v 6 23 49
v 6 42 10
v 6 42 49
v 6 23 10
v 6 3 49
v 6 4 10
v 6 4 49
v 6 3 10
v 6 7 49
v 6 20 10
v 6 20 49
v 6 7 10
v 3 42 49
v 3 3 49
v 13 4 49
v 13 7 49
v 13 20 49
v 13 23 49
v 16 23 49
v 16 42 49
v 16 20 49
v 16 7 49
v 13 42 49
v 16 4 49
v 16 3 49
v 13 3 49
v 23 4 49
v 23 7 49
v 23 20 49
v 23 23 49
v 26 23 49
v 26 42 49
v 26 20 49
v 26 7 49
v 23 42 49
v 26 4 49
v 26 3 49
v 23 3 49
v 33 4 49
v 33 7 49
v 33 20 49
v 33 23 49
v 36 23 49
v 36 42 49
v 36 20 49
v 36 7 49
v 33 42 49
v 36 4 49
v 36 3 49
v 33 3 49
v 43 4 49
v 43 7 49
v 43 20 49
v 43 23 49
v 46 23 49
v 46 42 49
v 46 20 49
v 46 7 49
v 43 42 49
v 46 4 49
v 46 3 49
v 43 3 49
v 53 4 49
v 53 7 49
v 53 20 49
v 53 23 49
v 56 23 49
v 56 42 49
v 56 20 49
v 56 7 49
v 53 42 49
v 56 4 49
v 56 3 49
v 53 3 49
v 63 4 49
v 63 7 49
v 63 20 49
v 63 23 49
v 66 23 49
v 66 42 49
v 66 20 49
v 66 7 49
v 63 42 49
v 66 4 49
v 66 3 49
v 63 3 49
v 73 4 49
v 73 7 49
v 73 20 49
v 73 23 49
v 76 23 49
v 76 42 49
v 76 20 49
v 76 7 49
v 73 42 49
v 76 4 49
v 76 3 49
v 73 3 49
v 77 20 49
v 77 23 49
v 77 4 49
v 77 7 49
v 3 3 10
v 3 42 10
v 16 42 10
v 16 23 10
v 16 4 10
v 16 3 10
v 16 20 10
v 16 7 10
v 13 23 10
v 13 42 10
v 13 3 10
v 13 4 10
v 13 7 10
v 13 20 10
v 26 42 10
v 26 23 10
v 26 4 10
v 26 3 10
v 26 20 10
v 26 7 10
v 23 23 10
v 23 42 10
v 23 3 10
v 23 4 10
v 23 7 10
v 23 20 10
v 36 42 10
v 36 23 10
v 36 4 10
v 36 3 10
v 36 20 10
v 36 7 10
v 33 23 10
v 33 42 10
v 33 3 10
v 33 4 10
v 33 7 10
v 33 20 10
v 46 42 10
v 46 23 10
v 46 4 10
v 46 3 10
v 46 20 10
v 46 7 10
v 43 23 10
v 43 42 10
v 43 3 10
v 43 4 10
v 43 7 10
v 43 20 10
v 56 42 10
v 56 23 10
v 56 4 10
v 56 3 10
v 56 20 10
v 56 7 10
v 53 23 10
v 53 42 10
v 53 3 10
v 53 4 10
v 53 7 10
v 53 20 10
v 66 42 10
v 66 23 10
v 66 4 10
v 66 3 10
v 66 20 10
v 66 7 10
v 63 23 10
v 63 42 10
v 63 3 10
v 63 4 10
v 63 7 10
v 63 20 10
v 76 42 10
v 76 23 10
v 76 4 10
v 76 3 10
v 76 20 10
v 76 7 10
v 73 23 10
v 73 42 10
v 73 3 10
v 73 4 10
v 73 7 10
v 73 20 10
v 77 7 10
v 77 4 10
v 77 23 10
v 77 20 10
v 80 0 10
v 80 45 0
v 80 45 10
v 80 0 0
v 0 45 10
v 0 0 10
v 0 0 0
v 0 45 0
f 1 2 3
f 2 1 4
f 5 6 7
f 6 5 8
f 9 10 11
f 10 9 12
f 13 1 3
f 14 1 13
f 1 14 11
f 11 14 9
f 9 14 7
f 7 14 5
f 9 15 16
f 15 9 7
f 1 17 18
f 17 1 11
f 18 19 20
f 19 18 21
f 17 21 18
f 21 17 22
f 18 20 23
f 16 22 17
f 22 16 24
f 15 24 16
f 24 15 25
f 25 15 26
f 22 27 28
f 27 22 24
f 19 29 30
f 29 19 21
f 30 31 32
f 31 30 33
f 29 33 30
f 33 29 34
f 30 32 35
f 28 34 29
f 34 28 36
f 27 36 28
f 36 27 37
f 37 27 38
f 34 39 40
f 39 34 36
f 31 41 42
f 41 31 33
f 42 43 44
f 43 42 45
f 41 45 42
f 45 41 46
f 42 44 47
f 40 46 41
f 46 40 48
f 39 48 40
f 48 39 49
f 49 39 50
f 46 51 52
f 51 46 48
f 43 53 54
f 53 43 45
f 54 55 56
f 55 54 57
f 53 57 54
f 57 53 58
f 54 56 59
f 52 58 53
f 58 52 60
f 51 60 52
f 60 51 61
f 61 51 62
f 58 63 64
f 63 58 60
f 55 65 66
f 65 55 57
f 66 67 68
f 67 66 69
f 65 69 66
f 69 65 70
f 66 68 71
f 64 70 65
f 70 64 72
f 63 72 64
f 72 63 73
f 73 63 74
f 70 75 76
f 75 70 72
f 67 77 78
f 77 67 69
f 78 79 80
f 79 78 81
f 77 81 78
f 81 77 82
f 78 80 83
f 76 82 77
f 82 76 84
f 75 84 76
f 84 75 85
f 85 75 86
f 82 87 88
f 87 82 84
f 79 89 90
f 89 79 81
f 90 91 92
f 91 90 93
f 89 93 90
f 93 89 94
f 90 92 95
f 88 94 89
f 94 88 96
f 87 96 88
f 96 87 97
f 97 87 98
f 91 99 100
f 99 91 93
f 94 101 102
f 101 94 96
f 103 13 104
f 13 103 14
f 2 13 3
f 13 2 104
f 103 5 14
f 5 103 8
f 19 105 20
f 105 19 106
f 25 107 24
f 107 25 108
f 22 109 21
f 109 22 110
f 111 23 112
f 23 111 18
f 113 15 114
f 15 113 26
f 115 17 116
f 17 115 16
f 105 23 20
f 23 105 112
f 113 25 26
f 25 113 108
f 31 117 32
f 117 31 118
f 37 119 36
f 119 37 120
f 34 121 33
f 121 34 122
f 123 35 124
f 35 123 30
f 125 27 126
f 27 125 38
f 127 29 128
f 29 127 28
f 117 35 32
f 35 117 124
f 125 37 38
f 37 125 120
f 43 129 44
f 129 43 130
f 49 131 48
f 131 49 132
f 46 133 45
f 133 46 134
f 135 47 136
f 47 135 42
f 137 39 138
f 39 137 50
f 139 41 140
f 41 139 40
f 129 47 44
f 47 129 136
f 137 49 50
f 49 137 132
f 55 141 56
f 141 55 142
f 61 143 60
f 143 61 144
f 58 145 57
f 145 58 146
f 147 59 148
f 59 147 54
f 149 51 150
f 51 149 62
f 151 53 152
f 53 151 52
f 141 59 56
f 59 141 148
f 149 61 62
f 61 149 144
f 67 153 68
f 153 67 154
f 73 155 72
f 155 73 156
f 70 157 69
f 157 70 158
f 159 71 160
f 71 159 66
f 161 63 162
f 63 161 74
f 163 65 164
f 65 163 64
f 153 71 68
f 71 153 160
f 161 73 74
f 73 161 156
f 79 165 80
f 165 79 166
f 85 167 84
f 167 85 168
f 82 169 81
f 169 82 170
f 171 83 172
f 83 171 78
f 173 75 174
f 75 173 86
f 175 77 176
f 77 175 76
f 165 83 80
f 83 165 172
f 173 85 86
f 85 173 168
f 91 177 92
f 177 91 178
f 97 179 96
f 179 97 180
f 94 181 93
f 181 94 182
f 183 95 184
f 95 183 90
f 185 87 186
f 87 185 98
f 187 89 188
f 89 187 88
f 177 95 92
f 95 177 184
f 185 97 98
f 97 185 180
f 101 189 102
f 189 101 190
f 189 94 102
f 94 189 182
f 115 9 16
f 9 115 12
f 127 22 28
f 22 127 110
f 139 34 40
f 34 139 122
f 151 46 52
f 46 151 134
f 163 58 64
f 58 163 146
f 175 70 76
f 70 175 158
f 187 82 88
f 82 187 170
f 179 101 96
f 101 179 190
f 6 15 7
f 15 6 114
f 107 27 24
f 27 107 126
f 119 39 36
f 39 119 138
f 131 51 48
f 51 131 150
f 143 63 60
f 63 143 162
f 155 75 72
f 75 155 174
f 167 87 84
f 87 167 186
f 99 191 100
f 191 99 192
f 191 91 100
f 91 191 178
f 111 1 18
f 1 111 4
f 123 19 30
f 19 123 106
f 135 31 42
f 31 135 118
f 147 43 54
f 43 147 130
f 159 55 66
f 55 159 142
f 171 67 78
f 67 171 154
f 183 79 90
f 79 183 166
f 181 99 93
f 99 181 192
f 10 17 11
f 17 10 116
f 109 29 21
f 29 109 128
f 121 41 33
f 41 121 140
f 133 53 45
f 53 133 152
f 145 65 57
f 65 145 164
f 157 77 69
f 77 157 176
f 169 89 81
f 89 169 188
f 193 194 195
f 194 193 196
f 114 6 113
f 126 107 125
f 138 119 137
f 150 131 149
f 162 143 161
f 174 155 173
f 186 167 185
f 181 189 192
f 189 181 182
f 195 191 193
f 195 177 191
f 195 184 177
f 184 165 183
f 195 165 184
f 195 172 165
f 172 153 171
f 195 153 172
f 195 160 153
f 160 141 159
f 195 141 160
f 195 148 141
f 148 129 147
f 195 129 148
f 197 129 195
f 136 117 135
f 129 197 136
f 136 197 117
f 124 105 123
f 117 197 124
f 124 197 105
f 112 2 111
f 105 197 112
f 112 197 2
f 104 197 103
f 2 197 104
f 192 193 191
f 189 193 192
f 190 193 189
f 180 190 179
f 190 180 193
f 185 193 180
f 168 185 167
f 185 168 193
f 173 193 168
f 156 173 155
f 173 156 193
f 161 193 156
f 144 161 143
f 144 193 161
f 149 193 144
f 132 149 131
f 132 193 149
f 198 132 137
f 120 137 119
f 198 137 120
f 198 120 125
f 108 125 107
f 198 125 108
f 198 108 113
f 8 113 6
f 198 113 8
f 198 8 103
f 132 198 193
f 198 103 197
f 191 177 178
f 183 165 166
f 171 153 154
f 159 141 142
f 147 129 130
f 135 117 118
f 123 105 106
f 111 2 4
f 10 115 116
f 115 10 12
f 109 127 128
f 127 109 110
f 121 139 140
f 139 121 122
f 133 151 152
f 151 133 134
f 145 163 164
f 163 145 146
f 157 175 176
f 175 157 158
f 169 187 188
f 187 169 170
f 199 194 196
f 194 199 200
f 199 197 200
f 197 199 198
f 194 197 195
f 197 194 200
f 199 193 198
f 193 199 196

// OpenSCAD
$fn = 32;

// ----------------------------------------------------------------------
// Heatsink: cross fin block
// ----------------------------------------------------------------------

// --- parameters (mm) ---
base_l = 80;              // base length, X
base_w = 45;              // base width, Y
base_t = 10;              // base plate thickness
fin_h = 40;               // fin height above the base
fin_t = 3;                // fin thickness
edge = 3;                 // margin from the base ends
pitch = 10;               // fin pitch
rib_pitch = 16;           // cross rib pitch

n_fins = floor((base_l - 2 * edge - fin_t) / pitch) + 1;  // fin count
total_h = base_t + fin_h - 1;  // overall height
n_ribs = floor((base_w - 2 * edge) / rib_pitch);  // rib count

union() {
  cube([base_l, base_w, base_t]);
  for (i = [0 : n_fins - 1])
    translate([edge + i * pitch, edge, base_t - 1])
      cube([fin_t, base_w - 2 * edge, fin_h]);
  for (i = [0 : n_ribs - 1])
    translate([edge, edge + 1 + i * rib_pitch, base_t - 1])
      cube([base_l - 2 * edge, fin_t, fin_h]);
}
